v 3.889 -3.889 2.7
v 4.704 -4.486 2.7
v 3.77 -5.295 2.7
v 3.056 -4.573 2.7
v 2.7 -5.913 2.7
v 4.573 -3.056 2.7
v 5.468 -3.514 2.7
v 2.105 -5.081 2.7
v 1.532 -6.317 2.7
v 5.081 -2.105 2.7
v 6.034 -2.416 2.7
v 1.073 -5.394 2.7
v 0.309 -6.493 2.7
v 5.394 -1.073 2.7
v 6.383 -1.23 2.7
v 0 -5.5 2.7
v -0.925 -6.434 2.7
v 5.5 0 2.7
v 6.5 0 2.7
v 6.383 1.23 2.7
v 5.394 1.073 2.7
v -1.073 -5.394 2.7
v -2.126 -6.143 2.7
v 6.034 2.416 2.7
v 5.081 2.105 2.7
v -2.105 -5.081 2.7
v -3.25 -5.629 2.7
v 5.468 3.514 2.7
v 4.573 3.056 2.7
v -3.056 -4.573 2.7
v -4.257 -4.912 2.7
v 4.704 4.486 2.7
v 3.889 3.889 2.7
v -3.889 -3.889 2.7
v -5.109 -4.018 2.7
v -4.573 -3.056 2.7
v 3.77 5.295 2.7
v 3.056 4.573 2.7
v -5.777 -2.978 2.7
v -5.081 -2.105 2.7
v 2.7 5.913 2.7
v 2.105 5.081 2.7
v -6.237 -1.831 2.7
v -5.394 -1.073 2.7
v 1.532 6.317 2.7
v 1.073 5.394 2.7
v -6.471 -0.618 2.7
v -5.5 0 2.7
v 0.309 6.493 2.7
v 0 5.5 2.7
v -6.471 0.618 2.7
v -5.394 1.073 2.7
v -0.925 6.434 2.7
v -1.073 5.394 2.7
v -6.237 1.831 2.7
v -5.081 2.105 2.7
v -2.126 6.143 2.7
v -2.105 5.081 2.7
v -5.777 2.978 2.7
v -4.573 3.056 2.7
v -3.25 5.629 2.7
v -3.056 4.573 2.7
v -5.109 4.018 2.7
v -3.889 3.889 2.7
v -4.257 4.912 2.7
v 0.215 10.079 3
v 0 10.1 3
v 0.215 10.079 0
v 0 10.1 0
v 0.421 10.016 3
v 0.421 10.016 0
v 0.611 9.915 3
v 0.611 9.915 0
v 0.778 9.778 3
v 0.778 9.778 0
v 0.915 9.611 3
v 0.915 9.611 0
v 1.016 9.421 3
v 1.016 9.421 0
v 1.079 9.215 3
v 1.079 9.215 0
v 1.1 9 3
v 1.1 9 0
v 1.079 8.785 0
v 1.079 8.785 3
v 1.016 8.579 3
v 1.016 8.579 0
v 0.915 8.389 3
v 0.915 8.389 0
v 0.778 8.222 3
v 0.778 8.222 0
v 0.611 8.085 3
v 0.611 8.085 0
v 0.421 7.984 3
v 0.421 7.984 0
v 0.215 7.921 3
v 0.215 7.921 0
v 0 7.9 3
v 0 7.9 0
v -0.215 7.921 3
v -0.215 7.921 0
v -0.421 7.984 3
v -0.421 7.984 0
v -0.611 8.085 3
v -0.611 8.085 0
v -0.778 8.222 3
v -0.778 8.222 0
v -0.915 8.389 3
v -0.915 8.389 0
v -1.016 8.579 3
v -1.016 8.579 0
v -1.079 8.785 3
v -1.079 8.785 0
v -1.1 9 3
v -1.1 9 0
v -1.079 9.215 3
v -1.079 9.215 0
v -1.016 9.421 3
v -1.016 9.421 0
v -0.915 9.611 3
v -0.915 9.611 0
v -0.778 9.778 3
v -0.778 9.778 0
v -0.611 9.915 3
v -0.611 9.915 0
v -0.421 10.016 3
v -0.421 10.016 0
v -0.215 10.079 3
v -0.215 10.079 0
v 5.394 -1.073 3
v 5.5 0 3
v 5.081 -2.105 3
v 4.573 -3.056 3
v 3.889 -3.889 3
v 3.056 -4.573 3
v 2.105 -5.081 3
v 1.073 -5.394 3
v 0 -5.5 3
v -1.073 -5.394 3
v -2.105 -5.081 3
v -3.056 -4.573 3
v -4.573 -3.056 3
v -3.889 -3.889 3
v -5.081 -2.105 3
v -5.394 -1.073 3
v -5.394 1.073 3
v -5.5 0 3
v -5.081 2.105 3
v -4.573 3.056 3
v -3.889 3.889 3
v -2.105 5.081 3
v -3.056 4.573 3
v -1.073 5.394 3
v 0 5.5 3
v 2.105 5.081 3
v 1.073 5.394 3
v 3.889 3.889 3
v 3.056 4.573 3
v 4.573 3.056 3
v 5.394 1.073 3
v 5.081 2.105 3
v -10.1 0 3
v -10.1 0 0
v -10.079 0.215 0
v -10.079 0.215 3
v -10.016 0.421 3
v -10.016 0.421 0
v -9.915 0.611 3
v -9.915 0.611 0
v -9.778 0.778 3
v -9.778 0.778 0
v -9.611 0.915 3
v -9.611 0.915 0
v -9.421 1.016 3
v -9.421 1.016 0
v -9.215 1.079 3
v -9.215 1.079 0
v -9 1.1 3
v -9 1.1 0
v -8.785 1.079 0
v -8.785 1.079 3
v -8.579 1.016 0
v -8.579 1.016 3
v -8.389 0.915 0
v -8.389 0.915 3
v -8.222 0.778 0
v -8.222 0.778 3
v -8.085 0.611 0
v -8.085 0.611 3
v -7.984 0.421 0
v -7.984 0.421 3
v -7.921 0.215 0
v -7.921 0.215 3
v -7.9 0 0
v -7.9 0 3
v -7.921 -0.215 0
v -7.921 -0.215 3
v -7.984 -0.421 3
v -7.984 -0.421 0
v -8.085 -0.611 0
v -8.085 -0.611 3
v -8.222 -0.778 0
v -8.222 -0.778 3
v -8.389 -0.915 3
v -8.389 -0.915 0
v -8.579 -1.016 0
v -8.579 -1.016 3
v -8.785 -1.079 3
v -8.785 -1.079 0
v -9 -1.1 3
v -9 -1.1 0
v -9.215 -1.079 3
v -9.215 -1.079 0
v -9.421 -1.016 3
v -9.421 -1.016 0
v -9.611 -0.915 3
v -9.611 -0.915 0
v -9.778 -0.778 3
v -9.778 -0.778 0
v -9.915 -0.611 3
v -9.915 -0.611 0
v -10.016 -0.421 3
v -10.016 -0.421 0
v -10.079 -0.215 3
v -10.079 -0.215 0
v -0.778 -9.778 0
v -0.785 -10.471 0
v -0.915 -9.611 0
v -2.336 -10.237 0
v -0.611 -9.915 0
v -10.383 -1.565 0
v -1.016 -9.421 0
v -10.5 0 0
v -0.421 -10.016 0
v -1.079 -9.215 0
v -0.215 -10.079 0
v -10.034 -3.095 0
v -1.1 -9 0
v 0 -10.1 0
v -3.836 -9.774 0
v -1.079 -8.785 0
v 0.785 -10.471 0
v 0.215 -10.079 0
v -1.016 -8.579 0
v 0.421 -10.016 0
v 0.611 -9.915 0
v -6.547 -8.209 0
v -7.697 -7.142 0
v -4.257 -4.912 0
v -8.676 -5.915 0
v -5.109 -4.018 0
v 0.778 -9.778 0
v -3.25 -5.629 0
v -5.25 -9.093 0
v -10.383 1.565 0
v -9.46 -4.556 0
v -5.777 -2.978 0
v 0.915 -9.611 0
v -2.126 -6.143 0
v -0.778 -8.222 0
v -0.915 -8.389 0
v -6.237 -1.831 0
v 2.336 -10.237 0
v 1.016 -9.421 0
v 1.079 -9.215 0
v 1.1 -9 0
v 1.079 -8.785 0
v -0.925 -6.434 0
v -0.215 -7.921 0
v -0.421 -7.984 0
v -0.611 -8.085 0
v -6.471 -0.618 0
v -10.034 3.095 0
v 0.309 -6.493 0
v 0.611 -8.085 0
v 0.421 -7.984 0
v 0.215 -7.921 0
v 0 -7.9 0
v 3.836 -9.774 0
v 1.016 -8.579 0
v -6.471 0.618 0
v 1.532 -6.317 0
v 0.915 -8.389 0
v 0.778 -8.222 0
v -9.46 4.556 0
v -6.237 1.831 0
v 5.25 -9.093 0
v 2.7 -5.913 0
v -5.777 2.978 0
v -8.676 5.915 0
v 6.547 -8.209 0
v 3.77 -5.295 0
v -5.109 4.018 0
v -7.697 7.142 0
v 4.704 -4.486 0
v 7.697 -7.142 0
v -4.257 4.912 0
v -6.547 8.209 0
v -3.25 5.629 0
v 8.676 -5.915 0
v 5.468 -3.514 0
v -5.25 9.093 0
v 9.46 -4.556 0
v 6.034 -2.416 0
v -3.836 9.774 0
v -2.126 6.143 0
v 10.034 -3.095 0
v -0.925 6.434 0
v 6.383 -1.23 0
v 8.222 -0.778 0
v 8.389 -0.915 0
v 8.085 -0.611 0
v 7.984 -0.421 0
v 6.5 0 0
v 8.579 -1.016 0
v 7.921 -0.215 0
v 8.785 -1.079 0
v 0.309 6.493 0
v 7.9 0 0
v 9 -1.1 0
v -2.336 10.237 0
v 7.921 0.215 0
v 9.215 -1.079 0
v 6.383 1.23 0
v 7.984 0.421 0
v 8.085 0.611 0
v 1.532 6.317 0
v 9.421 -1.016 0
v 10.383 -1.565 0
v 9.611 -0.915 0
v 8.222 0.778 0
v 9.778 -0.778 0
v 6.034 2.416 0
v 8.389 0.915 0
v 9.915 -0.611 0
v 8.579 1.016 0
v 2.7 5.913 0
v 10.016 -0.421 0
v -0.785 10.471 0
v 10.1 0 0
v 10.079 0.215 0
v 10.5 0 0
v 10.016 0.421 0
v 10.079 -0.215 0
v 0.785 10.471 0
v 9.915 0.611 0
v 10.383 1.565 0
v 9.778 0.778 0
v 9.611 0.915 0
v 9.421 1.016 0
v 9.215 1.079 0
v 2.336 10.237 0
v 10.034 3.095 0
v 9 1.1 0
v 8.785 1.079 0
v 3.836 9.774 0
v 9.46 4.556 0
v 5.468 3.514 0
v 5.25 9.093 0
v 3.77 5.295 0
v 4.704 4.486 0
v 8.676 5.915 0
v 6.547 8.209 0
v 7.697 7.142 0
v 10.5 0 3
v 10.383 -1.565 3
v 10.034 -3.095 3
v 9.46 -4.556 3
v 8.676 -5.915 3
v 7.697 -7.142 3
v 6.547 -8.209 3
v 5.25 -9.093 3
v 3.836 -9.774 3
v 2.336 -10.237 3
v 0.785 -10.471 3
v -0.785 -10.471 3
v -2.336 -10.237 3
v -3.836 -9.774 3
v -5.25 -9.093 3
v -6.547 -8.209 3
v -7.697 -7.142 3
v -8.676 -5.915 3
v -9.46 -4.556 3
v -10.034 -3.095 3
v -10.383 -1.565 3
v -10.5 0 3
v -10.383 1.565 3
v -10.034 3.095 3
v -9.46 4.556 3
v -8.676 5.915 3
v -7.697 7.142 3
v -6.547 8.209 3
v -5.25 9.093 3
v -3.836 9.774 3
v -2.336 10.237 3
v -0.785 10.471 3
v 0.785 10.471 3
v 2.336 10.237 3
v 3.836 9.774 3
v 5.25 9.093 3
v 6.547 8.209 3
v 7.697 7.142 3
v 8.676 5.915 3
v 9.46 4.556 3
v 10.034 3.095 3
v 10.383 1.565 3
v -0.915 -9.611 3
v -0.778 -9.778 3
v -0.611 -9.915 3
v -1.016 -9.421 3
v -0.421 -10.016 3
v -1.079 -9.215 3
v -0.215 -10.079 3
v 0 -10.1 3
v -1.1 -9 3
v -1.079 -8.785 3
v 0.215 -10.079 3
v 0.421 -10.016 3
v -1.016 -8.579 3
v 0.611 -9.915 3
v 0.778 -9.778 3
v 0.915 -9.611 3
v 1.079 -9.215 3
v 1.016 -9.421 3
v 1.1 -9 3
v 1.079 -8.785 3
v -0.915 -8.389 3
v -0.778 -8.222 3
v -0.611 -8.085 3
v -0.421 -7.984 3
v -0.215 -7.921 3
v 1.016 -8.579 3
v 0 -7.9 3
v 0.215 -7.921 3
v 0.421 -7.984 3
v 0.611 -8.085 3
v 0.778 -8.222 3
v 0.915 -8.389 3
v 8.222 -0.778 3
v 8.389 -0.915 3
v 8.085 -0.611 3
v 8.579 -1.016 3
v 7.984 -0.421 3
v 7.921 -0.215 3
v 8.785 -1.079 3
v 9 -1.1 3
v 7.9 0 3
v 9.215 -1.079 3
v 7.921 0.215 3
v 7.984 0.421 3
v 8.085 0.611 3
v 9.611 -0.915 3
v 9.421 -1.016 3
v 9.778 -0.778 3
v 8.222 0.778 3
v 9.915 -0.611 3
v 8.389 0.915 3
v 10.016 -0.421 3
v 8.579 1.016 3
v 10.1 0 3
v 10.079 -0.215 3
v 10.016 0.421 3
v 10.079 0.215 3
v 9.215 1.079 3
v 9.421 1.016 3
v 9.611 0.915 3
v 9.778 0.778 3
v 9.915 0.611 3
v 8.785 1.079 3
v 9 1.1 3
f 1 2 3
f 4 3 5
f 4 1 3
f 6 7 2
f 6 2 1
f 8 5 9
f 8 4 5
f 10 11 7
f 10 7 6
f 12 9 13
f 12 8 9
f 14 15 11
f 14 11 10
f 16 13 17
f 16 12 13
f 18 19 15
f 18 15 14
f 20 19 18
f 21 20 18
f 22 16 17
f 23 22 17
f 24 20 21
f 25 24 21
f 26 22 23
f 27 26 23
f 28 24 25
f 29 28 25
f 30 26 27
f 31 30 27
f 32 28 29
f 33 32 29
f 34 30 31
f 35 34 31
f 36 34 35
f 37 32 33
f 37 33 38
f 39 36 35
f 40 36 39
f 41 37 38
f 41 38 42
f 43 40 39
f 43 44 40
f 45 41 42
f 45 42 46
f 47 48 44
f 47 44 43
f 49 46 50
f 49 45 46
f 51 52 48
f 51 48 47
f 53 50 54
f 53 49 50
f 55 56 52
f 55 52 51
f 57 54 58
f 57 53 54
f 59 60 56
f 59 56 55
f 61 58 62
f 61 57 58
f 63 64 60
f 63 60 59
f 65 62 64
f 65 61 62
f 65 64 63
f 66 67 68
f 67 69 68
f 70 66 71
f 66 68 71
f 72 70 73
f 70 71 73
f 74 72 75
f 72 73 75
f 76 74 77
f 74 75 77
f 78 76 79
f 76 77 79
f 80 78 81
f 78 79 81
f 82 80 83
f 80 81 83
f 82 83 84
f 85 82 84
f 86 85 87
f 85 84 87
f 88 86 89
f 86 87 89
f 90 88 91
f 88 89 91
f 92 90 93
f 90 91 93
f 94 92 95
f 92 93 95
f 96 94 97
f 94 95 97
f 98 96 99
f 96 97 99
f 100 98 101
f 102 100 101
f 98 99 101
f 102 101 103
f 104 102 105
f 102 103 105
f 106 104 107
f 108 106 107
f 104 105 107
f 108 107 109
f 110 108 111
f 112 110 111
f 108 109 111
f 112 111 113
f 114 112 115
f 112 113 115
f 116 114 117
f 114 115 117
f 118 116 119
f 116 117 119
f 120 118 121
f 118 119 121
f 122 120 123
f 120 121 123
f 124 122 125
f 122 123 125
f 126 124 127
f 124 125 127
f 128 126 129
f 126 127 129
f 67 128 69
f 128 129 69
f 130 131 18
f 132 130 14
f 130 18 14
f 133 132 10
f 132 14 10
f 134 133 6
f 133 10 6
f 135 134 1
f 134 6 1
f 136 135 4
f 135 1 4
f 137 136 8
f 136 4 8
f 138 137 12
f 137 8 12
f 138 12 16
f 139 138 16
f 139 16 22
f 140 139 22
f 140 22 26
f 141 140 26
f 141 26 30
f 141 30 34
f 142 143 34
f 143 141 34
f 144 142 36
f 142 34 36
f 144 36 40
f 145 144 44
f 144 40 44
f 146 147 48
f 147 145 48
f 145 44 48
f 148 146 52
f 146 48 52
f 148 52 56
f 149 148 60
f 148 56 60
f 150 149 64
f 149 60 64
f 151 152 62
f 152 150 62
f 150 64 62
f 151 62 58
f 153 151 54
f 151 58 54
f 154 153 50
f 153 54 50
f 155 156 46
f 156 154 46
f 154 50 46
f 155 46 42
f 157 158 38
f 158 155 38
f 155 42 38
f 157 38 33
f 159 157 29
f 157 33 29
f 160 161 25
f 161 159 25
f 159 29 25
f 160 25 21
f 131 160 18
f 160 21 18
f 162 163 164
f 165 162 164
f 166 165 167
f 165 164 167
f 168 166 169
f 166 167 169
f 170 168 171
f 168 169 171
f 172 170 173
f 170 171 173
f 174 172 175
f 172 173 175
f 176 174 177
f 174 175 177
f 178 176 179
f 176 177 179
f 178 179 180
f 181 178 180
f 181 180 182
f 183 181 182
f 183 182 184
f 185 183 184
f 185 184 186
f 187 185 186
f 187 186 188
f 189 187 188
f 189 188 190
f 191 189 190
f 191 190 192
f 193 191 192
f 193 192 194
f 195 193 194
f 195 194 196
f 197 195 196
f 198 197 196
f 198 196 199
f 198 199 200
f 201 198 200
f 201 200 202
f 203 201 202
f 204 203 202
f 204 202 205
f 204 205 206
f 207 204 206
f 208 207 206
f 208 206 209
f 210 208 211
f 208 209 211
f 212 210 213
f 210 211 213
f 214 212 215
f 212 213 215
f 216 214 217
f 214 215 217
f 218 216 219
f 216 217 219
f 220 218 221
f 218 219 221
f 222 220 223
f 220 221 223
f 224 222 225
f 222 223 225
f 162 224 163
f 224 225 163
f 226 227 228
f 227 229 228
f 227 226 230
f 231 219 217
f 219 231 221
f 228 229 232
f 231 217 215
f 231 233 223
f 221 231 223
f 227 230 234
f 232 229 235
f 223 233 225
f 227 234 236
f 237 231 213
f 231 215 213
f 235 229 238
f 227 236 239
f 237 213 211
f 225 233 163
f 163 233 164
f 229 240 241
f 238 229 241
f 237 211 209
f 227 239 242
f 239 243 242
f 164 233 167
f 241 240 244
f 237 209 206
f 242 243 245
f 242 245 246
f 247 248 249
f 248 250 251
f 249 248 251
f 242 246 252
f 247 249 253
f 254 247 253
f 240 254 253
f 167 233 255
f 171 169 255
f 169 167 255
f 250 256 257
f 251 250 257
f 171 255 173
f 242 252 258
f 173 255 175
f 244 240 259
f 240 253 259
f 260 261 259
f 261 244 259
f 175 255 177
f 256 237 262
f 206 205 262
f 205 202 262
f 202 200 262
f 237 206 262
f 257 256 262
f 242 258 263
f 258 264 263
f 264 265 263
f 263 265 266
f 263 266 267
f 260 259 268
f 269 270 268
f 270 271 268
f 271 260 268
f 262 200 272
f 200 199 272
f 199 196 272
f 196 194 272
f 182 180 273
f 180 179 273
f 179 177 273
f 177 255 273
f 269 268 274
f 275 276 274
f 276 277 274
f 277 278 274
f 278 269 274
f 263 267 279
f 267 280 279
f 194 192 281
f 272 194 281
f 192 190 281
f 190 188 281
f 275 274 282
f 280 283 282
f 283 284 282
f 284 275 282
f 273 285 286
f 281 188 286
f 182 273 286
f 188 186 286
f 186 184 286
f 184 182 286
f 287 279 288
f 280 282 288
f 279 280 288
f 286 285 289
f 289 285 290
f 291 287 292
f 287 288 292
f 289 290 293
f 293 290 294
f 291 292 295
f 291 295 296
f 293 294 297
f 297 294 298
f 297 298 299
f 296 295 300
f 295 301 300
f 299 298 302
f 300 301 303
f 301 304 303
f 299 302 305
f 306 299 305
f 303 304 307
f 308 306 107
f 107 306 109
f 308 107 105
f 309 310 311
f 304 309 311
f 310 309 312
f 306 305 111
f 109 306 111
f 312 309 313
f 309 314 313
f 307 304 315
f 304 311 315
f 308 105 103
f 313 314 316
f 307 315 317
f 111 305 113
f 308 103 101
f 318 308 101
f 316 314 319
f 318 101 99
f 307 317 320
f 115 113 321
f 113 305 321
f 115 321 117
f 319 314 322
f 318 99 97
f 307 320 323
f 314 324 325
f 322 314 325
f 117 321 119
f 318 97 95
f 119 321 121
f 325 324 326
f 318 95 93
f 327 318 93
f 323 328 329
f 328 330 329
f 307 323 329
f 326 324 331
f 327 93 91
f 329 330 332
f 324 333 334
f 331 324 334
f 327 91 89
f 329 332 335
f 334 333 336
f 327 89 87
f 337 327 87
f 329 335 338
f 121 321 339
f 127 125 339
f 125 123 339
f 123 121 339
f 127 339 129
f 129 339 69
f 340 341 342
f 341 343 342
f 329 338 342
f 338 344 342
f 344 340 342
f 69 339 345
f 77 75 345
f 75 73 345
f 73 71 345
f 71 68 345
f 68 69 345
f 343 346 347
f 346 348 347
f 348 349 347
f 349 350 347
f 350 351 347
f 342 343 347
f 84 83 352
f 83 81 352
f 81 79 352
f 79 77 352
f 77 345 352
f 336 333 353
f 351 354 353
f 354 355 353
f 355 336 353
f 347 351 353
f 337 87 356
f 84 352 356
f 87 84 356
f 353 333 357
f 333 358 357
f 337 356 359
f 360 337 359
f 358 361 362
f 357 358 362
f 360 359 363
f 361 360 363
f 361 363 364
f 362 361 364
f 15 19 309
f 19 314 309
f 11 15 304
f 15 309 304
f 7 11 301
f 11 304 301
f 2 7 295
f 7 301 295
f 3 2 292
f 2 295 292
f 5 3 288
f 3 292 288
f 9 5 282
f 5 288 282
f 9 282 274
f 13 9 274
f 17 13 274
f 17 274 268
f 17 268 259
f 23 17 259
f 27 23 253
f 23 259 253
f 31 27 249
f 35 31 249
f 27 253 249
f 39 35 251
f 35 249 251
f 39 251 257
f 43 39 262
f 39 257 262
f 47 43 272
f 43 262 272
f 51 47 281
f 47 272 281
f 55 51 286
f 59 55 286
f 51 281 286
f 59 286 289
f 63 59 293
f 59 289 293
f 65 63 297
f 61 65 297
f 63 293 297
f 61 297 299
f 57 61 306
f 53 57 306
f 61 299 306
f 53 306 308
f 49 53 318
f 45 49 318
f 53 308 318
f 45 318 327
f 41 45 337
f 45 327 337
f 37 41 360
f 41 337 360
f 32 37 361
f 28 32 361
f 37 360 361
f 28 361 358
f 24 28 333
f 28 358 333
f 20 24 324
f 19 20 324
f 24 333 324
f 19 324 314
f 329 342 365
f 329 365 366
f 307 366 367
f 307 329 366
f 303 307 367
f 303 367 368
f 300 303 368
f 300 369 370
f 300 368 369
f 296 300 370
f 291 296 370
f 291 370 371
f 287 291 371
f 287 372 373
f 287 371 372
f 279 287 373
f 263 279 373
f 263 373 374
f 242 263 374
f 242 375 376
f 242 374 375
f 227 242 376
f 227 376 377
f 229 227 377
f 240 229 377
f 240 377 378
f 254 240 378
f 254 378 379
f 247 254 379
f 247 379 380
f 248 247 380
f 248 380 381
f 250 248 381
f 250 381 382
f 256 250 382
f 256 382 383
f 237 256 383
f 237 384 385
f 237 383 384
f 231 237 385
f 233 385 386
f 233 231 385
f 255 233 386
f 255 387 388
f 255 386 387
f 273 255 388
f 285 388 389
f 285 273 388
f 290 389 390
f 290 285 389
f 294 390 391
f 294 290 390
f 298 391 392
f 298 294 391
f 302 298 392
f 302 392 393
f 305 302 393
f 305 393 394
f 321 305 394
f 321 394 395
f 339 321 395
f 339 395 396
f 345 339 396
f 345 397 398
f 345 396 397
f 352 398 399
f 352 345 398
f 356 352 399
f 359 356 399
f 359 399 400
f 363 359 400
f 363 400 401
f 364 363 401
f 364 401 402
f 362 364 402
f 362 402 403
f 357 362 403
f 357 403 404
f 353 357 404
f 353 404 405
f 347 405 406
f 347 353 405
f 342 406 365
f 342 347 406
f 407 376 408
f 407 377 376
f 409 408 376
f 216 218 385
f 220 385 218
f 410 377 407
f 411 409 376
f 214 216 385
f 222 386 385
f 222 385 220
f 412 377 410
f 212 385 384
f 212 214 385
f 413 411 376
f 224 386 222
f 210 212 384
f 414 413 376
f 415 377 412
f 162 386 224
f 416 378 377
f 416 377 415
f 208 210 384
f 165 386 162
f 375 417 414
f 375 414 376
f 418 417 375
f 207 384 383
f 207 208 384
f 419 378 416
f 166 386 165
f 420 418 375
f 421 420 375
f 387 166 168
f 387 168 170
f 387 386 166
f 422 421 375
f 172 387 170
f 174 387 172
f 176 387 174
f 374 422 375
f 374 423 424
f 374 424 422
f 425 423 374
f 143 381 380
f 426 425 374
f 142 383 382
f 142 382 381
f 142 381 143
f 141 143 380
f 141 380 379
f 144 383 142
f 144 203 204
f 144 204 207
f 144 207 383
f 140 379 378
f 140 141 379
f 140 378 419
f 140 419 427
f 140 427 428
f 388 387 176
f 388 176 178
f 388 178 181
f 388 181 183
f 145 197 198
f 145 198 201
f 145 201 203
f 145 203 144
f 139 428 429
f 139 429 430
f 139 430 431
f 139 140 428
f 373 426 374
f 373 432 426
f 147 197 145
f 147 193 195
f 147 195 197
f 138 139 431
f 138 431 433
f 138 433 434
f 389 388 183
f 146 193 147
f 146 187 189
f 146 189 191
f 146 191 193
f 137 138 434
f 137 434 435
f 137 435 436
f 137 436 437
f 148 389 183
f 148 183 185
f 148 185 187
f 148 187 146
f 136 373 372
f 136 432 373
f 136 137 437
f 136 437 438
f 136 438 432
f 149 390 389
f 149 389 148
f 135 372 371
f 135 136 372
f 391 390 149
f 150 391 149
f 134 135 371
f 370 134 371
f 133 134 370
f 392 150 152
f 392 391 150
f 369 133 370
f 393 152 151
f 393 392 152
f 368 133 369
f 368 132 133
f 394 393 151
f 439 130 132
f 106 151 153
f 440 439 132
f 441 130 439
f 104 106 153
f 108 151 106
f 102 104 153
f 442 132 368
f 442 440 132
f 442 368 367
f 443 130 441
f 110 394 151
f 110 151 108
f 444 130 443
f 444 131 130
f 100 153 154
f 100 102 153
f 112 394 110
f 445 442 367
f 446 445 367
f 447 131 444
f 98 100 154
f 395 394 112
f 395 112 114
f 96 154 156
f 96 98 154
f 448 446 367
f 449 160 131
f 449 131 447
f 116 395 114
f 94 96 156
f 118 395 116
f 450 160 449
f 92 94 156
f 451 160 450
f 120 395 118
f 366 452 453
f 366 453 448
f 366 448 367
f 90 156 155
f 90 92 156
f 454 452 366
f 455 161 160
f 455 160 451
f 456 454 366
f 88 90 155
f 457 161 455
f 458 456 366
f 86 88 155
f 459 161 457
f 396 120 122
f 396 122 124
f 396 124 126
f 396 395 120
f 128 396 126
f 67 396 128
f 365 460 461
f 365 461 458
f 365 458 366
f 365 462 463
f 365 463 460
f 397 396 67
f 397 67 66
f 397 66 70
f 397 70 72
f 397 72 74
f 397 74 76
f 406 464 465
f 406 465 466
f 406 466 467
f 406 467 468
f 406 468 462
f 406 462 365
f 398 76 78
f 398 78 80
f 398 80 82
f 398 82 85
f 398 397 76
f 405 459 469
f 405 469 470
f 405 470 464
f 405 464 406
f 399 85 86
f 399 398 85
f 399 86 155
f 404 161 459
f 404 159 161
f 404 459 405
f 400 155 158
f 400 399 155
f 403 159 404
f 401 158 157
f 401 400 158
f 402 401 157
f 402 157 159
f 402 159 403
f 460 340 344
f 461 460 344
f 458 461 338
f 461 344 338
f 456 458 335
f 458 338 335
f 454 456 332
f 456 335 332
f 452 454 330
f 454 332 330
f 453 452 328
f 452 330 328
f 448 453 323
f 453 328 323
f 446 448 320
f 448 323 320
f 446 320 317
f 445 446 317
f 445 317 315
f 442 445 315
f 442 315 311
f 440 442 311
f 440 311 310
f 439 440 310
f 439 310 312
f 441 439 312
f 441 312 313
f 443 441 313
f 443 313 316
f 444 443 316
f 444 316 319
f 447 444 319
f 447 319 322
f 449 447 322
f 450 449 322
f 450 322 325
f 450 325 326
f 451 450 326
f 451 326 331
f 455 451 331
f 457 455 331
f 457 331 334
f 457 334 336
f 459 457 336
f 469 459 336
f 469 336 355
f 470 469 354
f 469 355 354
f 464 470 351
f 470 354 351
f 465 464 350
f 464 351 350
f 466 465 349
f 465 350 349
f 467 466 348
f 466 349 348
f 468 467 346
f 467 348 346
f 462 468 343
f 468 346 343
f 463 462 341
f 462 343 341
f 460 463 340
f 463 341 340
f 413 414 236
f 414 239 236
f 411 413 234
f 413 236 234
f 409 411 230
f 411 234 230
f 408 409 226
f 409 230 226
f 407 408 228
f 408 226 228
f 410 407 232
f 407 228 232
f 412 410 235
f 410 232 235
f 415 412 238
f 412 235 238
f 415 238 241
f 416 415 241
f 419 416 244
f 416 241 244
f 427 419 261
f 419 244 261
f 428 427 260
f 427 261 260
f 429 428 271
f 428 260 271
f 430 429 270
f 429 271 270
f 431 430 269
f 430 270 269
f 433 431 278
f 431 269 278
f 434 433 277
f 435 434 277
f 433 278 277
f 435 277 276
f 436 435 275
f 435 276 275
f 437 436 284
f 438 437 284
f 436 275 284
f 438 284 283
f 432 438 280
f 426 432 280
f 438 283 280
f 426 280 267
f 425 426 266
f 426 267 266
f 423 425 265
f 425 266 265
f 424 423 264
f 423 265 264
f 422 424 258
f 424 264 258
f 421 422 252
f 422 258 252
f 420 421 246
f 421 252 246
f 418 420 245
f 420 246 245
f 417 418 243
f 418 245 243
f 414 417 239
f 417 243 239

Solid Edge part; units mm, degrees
sketch "Sketch1" plane through (0, 0, 0) normal (0, 0, 1) x (1, 0, 0)
  circle A0 centre (0, 0) radius 10.5
  circle A1 centre (0, 0) radius 5.5
extrude "Protrusion1" add sketch "Sketch1" along normal blind 3
sketch "Sketch2" plane through (0, 0, 0) normal (0, 0, -1) x (1, 0, 0)
  circle A0 centre (0, 0) radius 6.5
extrude "ExtrudedCutout_1" cut sketch "Sketch2" against normal blind 2.7
hole "Hole_1" at (0, 9, 0) direction (0, 0, 1) diameter 2.2 end up to next
pattern_circular "Pattern1" count 4 over 360 about axis through (0, 0, 0) along (0, 0, 1) of "Hole_1"
